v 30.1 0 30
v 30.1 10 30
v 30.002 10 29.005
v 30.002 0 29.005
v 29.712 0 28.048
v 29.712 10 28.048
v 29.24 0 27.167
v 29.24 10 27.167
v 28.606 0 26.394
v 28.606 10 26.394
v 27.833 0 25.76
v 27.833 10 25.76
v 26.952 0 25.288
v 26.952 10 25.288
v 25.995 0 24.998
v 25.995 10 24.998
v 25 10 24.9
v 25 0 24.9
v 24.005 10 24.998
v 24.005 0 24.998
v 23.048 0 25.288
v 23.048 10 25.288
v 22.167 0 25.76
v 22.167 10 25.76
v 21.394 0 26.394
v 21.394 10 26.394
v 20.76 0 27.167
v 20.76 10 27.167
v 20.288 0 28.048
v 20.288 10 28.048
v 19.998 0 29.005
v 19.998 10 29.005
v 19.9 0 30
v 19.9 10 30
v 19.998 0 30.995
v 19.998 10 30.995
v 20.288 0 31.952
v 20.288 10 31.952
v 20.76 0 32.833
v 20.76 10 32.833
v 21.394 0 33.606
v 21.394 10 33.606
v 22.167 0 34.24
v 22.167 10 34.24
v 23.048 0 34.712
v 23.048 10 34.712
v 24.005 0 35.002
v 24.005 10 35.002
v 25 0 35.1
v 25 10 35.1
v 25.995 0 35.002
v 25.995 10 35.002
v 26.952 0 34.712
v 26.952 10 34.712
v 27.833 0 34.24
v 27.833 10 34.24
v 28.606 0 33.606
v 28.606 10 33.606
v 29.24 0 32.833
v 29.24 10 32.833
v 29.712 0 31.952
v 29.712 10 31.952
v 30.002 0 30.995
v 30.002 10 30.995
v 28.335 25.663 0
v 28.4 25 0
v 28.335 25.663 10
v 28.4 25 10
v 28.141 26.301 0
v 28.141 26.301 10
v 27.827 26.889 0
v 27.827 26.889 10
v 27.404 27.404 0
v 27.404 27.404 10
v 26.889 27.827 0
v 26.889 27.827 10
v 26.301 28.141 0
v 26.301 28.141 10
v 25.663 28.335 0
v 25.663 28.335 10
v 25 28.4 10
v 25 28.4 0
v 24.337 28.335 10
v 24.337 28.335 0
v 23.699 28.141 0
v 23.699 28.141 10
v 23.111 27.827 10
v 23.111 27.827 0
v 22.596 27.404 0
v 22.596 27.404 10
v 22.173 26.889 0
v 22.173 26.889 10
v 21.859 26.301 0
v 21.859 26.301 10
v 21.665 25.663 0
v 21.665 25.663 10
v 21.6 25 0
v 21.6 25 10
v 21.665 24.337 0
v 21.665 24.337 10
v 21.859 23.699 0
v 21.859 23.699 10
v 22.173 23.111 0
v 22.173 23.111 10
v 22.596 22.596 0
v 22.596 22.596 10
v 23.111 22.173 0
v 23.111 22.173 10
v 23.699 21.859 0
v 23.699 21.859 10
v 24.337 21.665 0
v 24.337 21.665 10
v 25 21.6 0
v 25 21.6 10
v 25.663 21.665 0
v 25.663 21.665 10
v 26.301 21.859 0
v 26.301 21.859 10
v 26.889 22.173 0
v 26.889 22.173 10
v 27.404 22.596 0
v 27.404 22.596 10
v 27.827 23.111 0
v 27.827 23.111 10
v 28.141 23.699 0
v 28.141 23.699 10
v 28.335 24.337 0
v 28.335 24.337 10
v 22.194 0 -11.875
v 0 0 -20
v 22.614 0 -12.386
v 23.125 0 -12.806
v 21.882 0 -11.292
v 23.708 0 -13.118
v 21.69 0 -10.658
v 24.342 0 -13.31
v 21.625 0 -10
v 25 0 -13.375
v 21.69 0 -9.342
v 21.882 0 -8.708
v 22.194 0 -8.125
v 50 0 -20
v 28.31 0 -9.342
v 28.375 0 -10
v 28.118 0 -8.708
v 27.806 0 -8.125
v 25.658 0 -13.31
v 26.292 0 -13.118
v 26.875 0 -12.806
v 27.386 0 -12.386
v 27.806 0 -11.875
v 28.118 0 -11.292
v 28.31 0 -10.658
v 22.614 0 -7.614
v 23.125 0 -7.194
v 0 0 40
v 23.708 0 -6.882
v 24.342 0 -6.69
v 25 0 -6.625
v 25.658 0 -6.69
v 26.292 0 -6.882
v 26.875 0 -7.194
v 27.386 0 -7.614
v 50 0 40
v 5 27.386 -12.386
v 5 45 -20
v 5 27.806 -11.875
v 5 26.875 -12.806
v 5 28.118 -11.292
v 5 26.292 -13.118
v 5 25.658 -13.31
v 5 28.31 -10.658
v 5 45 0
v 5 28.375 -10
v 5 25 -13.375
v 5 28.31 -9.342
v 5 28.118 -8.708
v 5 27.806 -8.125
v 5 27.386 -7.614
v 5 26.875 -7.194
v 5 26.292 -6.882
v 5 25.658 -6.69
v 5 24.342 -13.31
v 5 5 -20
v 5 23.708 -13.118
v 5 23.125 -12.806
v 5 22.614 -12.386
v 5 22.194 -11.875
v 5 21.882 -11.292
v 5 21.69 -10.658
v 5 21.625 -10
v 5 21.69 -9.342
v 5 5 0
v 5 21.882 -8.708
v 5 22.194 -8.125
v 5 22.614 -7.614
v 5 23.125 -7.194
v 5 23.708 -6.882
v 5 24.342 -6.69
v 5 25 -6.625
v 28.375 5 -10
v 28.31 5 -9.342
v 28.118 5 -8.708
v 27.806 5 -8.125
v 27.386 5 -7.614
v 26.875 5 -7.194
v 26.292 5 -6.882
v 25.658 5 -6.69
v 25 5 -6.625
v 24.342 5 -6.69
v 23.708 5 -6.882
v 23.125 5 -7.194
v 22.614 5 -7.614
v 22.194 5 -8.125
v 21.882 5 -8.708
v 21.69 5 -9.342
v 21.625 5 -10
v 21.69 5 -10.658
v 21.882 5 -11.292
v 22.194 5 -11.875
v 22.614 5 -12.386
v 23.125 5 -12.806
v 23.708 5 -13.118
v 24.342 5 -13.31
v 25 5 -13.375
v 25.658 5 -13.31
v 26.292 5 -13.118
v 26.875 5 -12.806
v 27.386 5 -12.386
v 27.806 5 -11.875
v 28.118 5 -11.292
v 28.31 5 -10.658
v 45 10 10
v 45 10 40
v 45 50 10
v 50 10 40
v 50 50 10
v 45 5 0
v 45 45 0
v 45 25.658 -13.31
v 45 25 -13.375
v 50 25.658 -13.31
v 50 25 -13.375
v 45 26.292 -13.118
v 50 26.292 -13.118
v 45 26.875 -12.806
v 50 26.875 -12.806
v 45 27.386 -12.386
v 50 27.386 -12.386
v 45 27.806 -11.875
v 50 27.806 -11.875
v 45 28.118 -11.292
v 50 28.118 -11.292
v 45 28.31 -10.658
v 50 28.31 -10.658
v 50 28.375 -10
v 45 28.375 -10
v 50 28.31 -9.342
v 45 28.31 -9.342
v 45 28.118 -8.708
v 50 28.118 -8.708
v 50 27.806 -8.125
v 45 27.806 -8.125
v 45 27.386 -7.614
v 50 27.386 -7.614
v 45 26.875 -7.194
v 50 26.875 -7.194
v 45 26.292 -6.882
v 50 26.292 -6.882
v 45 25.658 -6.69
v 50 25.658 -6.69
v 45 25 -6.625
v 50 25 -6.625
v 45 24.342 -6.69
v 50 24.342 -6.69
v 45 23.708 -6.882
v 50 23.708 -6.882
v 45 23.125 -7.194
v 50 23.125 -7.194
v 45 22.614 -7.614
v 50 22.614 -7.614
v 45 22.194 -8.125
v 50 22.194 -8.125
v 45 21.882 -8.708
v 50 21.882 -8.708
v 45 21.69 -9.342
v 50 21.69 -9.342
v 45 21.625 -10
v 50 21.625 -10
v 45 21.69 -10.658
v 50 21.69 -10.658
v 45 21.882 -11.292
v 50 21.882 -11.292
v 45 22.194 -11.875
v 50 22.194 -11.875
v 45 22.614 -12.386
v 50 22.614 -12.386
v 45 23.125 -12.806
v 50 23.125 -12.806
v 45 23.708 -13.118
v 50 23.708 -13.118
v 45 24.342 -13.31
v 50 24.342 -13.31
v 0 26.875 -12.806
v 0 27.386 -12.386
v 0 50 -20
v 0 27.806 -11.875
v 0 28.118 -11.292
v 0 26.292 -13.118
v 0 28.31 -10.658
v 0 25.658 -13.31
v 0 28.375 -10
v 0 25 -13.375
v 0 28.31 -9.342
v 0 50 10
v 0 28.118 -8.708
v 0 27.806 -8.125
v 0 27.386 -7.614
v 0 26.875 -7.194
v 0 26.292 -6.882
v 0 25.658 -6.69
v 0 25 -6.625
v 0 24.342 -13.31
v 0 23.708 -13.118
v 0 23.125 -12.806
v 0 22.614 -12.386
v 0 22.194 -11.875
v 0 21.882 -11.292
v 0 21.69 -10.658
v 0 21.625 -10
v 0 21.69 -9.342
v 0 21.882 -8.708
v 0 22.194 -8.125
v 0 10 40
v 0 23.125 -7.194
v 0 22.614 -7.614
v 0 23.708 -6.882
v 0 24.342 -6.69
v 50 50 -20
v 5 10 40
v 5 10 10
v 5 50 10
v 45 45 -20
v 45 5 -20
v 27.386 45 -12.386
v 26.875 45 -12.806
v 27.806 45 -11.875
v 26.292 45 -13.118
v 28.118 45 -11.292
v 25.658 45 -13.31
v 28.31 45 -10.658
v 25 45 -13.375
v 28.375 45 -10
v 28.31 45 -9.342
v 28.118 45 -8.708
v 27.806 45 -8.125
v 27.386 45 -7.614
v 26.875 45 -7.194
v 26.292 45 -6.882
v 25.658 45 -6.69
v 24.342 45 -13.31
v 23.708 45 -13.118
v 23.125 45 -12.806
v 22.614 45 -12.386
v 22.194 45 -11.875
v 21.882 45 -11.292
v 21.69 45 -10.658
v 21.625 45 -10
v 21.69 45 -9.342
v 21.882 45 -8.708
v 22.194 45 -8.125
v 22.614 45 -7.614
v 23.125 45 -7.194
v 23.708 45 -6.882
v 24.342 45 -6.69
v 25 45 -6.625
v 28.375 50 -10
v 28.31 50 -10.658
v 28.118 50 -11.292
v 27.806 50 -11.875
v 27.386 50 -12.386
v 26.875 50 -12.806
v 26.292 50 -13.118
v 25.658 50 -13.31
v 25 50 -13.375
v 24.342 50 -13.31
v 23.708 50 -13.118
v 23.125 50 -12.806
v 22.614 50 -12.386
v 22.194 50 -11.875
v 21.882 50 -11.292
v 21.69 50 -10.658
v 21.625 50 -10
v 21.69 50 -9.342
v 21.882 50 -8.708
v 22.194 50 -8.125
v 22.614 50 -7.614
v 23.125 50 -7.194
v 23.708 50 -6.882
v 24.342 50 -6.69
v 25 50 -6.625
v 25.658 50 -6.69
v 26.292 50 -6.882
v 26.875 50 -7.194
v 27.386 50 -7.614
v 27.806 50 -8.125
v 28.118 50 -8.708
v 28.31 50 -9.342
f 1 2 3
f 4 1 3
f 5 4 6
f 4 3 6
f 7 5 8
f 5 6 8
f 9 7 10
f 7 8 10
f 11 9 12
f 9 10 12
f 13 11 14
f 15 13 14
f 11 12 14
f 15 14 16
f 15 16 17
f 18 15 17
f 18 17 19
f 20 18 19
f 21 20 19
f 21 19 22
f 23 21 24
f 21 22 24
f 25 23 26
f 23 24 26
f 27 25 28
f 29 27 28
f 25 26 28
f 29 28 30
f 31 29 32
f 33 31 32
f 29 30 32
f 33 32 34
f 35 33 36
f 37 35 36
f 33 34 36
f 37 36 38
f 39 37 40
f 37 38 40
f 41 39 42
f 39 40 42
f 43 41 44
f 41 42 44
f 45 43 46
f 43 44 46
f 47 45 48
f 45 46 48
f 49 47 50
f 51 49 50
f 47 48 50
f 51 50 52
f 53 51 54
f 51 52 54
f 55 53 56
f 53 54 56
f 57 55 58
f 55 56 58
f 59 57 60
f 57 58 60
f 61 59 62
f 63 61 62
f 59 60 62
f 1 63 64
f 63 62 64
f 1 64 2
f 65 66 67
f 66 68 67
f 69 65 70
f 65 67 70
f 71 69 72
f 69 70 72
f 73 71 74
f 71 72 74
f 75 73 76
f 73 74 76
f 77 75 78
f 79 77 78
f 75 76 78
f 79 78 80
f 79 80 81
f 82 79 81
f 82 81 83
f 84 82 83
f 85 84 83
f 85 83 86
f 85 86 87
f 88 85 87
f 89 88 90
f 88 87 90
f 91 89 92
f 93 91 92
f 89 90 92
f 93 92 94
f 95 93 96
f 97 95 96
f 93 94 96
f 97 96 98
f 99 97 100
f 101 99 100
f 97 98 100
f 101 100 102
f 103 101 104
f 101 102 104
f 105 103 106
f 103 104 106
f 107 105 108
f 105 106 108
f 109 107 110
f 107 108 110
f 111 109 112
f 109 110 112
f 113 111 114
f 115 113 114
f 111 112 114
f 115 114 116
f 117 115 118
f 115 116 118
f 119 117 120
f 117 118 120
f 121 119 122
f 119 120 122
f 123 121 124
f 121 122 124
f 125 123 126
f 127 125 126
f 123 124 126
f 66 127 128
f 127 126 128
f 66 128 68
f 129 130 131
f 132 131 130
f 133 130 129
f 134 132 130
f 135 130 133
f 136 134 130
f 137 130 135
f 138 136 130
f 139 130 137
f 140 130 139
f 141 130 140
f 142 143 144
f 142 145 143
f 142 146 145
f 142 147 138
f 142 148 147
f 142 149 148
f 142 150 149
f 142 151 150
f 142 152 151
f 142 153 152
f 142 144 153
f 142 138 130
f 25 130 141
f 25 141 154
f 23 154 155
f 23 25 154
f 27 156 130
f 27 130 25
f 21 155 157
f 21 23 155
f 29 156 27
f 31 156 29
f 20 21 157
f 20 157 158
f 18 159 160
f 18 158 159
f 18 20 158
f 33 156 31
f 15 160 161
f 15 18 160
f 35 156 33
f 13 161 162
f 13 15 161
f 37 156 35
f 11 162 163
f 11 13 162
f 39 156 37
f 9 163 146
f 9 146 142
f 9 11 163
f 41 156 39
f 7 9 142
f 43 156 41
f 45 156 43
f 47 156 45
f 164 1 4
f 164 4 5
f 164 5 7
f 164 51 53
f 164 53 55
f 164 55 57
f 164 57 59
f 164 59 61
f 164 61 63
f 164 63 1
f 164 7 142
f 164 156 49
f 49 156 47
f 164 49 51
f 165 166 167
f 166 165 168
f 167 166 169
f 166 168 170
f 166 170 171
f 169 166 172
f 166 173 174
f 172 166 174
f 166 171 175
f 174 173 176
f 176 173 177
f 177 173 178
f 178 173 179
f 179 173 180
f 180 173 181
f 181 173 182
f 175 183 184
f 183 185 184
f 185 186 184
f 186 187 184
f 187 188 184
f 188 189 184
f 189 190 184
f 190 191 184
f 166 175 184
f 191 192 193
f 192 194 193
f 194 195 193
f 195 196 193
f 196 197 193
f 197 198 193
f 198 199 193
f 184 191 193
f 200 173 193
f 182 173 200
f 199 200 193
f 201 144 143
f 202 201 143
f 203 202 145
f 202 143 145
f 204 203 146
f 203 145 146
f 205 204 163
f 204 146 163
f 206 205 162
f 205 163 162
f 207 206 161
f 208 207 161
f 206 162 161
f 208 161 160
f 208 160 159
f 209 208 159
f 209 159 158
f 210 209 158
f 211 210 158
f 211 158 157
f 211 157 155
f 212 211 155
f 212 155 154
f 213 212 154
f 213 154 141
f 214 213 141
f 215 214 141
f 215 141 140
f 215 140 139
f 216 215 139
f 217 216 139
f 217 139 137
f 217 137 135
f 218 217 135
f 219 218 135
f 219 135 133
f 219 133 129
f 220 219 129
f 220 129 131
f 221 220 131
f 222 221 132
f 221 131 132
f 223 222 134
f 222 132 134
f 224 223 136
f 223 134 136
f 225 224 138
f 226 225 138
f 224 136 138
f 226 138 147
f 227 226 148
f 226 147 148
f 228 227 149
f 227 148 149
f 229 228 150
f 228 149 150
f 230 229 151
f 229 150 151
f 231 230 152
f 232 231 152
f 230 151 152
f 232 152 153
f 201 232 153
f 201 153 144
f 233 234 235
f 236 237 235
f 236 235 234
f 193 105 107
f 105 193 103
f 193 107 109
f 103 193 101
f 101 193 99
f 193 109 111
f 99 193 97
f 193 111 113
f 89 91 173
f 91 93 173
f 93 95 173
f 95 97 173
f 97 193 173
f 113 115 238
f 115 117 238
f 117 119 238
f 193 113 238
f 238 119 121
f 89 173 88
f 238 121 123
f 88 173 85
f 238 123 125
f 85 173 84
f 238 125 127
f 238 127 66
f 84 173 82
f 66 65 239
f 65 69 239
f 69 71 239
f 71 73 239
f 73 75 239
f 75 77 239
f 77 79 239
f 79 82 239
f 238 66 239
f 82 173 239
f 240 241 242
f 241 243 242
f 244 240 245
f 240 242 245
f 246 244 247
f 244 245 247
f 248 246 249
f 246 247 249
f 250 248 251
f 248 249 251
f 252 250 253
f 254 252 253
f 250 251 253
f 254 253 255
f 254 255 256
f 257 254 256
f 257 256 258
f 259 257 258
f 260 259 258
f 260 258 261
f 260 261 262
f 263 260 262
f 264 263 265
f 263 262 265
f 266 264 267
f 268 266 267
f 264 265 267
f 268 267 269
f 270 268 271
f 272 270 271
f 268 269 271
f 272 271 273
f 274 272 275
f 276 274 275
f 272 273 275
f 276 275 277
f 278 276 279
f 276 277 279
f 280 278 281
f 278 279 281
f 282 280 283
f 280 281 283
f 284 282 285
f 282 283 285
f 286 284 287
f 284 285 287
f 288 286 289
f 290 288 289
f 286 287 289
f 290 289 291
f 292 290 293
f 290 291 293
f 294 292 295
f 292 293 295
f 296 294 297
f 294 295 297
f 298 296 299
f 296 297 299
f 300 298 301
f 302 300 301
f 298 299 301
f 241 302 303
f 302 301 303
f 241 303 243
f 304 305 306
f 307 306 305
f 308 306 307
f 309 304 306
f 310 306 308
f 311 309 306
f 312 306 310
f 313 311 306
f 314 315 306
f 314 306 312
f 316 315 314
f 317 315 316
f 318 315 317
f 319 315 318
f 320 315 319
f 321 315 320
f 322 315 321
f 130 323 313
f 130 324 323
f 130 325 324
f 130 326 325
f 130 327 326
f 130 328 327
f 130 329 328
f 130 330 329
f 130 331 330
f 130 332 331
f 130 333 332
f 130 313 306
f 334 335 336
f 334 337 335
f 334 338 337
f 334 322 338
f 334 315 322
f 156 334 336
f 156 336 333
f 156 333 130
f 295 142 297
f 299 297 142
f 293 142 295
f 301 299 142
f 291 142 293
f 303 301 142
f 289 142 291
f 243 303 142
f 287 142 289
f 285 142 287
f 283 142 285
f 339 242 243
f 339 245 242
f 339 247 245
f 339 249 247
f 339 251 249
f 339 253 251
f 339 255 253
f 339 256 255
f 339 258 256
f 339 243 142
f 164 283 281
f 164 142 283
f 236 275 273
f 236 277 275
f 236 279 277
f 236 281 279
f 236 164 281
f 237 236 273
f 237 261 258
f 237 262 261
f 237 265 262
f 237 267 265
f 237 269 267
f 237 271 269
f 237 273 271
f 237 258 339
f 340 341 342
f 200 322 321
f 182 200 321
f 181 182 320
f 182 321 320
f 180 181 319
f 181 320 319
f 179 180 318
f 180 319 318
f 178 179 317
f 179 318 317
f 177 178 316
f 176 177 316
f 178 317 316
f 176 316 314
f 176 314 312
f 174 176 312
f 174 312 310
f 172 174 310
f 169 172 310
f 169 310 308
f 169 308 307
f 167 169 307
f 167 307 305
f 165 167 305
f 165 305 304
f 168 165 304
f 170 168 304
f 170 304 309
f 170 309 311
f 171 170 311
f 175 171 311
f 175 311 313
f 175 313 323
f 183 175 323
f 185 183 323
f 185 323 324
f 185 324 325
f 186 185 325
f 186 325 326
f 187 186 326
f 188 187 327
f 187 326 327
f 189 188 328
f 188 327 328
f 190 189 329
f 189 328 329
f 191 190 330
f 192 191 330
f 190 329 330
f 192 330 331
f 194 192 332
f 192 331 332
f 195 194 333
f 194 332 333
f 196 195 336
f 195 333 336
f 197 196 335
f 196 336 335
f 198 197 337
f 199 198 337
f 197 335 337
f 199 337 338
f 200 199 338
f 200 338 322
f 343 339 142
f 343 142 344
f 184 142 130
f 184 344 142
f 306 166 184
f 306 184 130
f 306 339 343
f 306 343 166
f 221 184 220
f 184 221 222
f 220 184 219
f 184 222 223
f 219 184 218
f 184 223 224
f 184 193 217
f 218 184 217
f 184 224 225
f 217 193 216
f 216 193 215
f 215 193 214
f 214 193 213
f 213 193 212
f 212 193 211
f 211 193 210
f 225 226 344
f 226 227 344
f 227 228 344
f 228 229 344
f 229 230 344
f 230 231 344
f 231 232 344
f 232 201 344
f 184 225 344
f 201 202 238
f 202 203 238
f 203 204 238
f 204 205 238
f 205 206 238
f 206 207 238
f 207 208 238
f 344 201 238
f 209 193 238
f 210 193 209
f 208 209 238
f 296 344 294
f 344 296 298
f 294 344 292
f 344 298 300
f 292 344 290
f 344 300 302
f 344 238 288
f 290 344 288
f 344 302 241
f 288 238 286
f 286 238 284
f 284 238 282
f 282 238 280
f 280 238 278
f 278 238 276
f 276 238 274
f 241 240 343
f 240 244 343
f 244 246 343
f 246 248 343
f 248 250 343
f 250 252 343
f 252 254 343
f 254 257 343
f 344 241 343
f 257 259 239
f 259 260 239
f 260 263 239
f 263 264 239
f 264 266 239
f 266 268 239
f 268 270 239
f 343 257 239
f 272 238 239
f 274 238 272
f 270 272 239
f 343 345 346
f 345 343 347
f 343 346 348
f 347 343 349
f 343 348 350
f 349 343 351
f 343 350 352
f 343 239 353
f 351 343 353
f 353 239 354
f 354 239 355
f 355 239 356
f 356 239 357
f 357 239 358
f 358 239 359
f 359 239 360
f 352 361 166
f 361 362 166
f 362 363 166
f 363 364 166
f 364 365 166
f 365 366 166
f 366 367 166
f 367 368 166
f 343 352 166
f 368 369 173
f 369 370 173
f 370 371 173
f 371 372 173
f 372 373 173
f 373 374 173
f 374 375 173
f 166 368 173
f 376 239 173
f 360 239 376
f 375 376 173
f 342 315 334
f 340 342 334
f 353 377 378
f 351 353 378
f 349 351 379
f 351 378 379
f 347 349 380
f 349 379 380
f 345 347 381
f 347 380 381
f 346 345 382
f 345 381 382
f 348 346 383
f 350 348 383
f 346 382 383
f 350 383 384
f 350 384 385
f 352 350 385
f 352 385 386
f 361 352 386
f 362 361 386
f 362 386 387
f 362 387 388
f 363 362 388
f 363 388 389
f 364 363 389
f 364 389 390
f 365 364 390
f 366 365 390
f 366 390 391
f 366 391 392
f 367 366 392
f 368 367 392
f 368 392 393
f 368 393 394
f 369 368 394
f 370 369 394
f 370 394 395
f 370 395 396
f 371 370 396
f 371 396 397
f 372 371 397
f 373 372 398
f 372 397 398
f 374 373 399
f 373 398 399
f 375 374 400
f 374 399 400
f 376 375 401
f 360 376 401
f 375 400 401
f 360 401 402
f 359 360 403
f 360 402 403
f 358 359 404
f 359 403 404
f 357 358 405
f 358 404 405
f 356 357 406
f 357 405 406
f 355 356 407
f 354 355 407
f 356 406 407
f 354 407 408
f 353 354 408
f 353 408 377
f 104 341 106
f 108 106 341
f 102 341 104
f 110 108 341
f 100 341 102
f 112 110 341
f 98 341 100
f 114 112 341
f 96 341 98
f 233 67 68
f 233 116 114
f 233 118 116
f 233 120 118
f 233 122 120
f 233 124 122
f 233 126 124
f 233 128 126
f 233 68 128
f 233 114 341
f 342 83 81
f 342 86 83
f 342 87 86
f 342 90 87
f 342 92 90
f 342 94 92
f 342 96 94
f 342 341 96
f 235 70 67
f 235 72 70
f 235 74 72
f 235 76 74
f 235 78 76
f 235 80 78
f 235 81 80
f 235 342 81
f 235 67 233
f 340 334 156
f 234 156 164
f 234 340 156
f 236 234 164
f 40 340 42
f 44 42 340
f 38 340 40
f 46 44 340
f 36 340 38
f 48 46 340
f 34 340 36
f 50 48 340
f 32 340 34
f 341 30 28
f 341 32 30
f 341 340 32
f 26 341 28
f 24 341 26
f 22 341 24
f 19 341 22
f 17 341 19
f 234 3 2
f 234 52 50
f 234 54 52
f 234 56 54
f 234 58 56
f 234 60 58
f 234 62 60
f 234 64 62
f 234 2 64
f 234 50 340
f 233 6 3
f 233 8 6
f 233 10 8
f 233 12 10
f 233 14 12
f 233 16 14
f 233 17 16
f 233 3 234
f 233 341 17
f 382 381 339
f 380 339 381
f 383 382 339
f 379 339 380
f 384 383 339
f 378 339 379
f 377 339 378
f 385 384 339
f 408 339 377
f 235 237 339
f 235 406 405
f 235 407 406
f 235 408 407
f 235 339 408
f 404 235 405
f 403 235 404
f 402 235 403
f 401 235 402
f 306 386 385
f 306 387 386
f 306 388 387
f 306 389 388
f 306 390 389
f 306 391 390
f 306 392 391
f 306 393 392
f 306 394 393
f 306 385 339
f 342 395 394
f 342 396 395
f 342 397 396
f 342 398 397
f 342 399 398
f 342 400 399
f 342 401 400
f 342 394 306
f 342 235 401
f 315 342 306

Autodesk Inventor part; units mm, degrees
ref_plane "YZ Plane" through (0, 0, 0) normal (1, 0, 0) x (0, 1, 0)
ref_plane "XZ Plane" through (0, 0, 0) normal (0, 1, 0) x (-1, 0, 0)
ref_plane "XY Plane" through (0, 0, 0) normal (0, 0, 1) x (1, 0, 0)
sketch "Boceto1" plane through (0, 0, 0) normal (0, 0, 1) x (1, 0, 0)
  line L0 (0, 0) -> (50, 0)
  line L1 (50, 0) -> (50, 50)
  line L2 (50, 50) -> (0, 50)
  line L3 (0, 50) -> (0, 0)
  line L4 (50, 0) -> (0, 0)
  line L5 (0, 0) -> (0, 10)
  line L6 (0, 10) -> (50, 10)
  line L7 (50, 10) -> (50, 0)
  dimension "d0" = 50
  dimension "d1" = 50
  dimension "d2" = 10
extrude "Extrusión1" add sketch "Boceto1" along normal blind 10
sketch "Boceto2" plane through (0, 0, 10) normal (0, 0, 1) x (1, 0, 0)
  line L0 (0, 0) -> (50, 0) projected
  line L1 (0, 50) -> (0, 0) projected
  line L2 (50, 0) -> (0, 0)
  line L3 (0, 0) -> (0, 10)
  line L4 (0, 10) -> (50, 10)
  line L5 (50, 10) -> (50, 0)
  dimension "d5" = 10
extrude "Extrusión2" add sketch "Boceto2" along normal blind 30
sketch "Boceto3" plane through (0, 0, 10) normal (0, 0, 1) x (1, 0, 0)
  circle A0 centre (25, 25) radius 3.4
  line L0 (0, 50) -> (0, 10) projected
  line L1 (0, 0) -> (50, 0) projected
  dimension "d8" = 6.8
  dimension "d9" = 25
  dimension "d10" = 25
extrude "Extrusión3" cut sketch "Boceto3" against normal blind 10
sketch "Boceto4" plane through (0, 10, 10) normal (0, 1, 0) x (1, 0, 0)
  circle A0 centre (25, -20) radius 5.1
  line L0 (50, 10) -> (0, 10) projected
  line L1 (0, 0) -> (0, -30) projected
  dimension "d13" = 10.2
  dimension "d14" = 30
  dimension "d15" = 25
extrude "Extrusión4" cut sketch "Boceto4" against normal blind 10
sketch "Boceto5" plane through (0, 0, 0) normal (-1, 0, 0) x (0, 0, 1)
  line L0 (0, 50) -> (10, 50) projected
  line L1 (10, 10) -> (40, 10) projected
  line L2 (10, 50) -> (40, 10)
  line L3 (40, 10) -> (10, 10)
  line L4 (10, 10) -> (10, 50)
  line L5 (10, 50) -> (10, 10) projected
  point P0 (0, 0)
extrude "Extrusión5" add sketch "Boceto5" against normal blind 5
sketch "Boceto6" plane through (50, 0, 0) normal (1, 0, 0) x (0, 0, -1)
  line L0 (-10, 50) -> (-40, 10) projected
  line L1 (-10, 10) -> (-40, 10) projected
  line L2 (-10, 50) -> (-40, 10)
  line L3 (-40, 10) -> (-10, 10)
  line L4 (-10, 50) -> (-10, 10) projected
  line L5 (-10, 10) -> (-10, 50)
  point P0 (0, 0)
sketch "Boceto7" plane through (50, 0, 0) normal (1, 0, 0) x (0, 0, -1)
  point P0 (0, 0)
sketch "Boceto8" plane through (0, 0, 10) normal (0, 0, 1) x (1, 0, 0)
  point P0 (0, 0)
extrude "Extrusión6" add sketch "Boceto6" against normal blind 5
sketch "Boceto9" plane through (0, 0, 0) normal (0, 0, -1) x (-1, 0, 0)
  line L0 (-5, 5) -> (-45, 5)
  line L1 (-45, 5) -> (-45, 45)
  line L2 (-45, 45) -> (-5, 45)
  line L3 (-5, 45) -> (-5, 5)
  line L4 (-50, 0) -> (-50, 50) projected
  line L5 (-50, 50) -> (0, 50) projected
  line L6 (0, 50) -> (0, 0) projected
  line L7 (0, 0) -> (-50, 0)
  line L8 (-50, 0) -> (-50, 50)
  line L9 (-50, 50) -> (0, 50)
  line L10 (0, 50) -> (0, 0)
extrude "Extrusión7" add sketch "Boceto9" along normal blind 20
sketch "Boceto10" plane through (50, 0, 40) normal (1, 0, 0) x (0, 0, -1)
  line L0 (0, 0) -> (0, 10) projected
  circle A0 centre (50, 25) radius 3.375
  line L1 (60, 0) -> (0, 0) projected
  line L2 (60, 50) -> (60, 0) projected
  point P0 (40, 0)
  dimension "d28" = 40
  dimension "d29" = 6.75
sketch "Boceto11" plane through (0, 0, 40) normal (0, -1, 0) x (1, 0, 0)
  circle A0 centre (25, -50) radius 3.375
  line L0 (0, -60) -> (0, 0) projected
  line L1 (50, -60) -> (0, -60) projected
  point P0 (0, -40)
  dimension "d32" = 6.75
sketch "Boceto12" plane through (0, 0, 40) normal (-1, 0, 0) x (0, 0, 1)
  circle A0 centre (-50, 25) radius 3.375
  line L0 (-60, 0) -> (-60, 50) projected
  line L1 (-30, 50) -> (-60, 50) projected
  point P0 (-40, 0)
  dimension "d35" = 6.75
sketch "Boceto13" plane through (0, 50, 10) normal (0, 1, 0) x (1, 0, 0)
  circle A0 centre (25, 20) radius 3.375
  line L0 (0, 30) -> (50, 30) projected
  line L1 (50, 30) -> (50, 0) projected
  point P0 (0, 10)
  dimension "d38" = 6.75
  dimension "d39" = 10
  dimension "d40" = 25
extrude "Extrusión8" cut sketch "Boceto13" against normal blind 5
extrude "Extrusión9" cut sketch "Boceto10" against normal blind 5
extrude "Extrusión10" cut sketch "Boceto11" against normal blind 5
extrude "Extrusión11" cut sketch "Boceto12" against normal blind 5
properties part number "UnionLlantaOmega" material "Plástico ABS"
